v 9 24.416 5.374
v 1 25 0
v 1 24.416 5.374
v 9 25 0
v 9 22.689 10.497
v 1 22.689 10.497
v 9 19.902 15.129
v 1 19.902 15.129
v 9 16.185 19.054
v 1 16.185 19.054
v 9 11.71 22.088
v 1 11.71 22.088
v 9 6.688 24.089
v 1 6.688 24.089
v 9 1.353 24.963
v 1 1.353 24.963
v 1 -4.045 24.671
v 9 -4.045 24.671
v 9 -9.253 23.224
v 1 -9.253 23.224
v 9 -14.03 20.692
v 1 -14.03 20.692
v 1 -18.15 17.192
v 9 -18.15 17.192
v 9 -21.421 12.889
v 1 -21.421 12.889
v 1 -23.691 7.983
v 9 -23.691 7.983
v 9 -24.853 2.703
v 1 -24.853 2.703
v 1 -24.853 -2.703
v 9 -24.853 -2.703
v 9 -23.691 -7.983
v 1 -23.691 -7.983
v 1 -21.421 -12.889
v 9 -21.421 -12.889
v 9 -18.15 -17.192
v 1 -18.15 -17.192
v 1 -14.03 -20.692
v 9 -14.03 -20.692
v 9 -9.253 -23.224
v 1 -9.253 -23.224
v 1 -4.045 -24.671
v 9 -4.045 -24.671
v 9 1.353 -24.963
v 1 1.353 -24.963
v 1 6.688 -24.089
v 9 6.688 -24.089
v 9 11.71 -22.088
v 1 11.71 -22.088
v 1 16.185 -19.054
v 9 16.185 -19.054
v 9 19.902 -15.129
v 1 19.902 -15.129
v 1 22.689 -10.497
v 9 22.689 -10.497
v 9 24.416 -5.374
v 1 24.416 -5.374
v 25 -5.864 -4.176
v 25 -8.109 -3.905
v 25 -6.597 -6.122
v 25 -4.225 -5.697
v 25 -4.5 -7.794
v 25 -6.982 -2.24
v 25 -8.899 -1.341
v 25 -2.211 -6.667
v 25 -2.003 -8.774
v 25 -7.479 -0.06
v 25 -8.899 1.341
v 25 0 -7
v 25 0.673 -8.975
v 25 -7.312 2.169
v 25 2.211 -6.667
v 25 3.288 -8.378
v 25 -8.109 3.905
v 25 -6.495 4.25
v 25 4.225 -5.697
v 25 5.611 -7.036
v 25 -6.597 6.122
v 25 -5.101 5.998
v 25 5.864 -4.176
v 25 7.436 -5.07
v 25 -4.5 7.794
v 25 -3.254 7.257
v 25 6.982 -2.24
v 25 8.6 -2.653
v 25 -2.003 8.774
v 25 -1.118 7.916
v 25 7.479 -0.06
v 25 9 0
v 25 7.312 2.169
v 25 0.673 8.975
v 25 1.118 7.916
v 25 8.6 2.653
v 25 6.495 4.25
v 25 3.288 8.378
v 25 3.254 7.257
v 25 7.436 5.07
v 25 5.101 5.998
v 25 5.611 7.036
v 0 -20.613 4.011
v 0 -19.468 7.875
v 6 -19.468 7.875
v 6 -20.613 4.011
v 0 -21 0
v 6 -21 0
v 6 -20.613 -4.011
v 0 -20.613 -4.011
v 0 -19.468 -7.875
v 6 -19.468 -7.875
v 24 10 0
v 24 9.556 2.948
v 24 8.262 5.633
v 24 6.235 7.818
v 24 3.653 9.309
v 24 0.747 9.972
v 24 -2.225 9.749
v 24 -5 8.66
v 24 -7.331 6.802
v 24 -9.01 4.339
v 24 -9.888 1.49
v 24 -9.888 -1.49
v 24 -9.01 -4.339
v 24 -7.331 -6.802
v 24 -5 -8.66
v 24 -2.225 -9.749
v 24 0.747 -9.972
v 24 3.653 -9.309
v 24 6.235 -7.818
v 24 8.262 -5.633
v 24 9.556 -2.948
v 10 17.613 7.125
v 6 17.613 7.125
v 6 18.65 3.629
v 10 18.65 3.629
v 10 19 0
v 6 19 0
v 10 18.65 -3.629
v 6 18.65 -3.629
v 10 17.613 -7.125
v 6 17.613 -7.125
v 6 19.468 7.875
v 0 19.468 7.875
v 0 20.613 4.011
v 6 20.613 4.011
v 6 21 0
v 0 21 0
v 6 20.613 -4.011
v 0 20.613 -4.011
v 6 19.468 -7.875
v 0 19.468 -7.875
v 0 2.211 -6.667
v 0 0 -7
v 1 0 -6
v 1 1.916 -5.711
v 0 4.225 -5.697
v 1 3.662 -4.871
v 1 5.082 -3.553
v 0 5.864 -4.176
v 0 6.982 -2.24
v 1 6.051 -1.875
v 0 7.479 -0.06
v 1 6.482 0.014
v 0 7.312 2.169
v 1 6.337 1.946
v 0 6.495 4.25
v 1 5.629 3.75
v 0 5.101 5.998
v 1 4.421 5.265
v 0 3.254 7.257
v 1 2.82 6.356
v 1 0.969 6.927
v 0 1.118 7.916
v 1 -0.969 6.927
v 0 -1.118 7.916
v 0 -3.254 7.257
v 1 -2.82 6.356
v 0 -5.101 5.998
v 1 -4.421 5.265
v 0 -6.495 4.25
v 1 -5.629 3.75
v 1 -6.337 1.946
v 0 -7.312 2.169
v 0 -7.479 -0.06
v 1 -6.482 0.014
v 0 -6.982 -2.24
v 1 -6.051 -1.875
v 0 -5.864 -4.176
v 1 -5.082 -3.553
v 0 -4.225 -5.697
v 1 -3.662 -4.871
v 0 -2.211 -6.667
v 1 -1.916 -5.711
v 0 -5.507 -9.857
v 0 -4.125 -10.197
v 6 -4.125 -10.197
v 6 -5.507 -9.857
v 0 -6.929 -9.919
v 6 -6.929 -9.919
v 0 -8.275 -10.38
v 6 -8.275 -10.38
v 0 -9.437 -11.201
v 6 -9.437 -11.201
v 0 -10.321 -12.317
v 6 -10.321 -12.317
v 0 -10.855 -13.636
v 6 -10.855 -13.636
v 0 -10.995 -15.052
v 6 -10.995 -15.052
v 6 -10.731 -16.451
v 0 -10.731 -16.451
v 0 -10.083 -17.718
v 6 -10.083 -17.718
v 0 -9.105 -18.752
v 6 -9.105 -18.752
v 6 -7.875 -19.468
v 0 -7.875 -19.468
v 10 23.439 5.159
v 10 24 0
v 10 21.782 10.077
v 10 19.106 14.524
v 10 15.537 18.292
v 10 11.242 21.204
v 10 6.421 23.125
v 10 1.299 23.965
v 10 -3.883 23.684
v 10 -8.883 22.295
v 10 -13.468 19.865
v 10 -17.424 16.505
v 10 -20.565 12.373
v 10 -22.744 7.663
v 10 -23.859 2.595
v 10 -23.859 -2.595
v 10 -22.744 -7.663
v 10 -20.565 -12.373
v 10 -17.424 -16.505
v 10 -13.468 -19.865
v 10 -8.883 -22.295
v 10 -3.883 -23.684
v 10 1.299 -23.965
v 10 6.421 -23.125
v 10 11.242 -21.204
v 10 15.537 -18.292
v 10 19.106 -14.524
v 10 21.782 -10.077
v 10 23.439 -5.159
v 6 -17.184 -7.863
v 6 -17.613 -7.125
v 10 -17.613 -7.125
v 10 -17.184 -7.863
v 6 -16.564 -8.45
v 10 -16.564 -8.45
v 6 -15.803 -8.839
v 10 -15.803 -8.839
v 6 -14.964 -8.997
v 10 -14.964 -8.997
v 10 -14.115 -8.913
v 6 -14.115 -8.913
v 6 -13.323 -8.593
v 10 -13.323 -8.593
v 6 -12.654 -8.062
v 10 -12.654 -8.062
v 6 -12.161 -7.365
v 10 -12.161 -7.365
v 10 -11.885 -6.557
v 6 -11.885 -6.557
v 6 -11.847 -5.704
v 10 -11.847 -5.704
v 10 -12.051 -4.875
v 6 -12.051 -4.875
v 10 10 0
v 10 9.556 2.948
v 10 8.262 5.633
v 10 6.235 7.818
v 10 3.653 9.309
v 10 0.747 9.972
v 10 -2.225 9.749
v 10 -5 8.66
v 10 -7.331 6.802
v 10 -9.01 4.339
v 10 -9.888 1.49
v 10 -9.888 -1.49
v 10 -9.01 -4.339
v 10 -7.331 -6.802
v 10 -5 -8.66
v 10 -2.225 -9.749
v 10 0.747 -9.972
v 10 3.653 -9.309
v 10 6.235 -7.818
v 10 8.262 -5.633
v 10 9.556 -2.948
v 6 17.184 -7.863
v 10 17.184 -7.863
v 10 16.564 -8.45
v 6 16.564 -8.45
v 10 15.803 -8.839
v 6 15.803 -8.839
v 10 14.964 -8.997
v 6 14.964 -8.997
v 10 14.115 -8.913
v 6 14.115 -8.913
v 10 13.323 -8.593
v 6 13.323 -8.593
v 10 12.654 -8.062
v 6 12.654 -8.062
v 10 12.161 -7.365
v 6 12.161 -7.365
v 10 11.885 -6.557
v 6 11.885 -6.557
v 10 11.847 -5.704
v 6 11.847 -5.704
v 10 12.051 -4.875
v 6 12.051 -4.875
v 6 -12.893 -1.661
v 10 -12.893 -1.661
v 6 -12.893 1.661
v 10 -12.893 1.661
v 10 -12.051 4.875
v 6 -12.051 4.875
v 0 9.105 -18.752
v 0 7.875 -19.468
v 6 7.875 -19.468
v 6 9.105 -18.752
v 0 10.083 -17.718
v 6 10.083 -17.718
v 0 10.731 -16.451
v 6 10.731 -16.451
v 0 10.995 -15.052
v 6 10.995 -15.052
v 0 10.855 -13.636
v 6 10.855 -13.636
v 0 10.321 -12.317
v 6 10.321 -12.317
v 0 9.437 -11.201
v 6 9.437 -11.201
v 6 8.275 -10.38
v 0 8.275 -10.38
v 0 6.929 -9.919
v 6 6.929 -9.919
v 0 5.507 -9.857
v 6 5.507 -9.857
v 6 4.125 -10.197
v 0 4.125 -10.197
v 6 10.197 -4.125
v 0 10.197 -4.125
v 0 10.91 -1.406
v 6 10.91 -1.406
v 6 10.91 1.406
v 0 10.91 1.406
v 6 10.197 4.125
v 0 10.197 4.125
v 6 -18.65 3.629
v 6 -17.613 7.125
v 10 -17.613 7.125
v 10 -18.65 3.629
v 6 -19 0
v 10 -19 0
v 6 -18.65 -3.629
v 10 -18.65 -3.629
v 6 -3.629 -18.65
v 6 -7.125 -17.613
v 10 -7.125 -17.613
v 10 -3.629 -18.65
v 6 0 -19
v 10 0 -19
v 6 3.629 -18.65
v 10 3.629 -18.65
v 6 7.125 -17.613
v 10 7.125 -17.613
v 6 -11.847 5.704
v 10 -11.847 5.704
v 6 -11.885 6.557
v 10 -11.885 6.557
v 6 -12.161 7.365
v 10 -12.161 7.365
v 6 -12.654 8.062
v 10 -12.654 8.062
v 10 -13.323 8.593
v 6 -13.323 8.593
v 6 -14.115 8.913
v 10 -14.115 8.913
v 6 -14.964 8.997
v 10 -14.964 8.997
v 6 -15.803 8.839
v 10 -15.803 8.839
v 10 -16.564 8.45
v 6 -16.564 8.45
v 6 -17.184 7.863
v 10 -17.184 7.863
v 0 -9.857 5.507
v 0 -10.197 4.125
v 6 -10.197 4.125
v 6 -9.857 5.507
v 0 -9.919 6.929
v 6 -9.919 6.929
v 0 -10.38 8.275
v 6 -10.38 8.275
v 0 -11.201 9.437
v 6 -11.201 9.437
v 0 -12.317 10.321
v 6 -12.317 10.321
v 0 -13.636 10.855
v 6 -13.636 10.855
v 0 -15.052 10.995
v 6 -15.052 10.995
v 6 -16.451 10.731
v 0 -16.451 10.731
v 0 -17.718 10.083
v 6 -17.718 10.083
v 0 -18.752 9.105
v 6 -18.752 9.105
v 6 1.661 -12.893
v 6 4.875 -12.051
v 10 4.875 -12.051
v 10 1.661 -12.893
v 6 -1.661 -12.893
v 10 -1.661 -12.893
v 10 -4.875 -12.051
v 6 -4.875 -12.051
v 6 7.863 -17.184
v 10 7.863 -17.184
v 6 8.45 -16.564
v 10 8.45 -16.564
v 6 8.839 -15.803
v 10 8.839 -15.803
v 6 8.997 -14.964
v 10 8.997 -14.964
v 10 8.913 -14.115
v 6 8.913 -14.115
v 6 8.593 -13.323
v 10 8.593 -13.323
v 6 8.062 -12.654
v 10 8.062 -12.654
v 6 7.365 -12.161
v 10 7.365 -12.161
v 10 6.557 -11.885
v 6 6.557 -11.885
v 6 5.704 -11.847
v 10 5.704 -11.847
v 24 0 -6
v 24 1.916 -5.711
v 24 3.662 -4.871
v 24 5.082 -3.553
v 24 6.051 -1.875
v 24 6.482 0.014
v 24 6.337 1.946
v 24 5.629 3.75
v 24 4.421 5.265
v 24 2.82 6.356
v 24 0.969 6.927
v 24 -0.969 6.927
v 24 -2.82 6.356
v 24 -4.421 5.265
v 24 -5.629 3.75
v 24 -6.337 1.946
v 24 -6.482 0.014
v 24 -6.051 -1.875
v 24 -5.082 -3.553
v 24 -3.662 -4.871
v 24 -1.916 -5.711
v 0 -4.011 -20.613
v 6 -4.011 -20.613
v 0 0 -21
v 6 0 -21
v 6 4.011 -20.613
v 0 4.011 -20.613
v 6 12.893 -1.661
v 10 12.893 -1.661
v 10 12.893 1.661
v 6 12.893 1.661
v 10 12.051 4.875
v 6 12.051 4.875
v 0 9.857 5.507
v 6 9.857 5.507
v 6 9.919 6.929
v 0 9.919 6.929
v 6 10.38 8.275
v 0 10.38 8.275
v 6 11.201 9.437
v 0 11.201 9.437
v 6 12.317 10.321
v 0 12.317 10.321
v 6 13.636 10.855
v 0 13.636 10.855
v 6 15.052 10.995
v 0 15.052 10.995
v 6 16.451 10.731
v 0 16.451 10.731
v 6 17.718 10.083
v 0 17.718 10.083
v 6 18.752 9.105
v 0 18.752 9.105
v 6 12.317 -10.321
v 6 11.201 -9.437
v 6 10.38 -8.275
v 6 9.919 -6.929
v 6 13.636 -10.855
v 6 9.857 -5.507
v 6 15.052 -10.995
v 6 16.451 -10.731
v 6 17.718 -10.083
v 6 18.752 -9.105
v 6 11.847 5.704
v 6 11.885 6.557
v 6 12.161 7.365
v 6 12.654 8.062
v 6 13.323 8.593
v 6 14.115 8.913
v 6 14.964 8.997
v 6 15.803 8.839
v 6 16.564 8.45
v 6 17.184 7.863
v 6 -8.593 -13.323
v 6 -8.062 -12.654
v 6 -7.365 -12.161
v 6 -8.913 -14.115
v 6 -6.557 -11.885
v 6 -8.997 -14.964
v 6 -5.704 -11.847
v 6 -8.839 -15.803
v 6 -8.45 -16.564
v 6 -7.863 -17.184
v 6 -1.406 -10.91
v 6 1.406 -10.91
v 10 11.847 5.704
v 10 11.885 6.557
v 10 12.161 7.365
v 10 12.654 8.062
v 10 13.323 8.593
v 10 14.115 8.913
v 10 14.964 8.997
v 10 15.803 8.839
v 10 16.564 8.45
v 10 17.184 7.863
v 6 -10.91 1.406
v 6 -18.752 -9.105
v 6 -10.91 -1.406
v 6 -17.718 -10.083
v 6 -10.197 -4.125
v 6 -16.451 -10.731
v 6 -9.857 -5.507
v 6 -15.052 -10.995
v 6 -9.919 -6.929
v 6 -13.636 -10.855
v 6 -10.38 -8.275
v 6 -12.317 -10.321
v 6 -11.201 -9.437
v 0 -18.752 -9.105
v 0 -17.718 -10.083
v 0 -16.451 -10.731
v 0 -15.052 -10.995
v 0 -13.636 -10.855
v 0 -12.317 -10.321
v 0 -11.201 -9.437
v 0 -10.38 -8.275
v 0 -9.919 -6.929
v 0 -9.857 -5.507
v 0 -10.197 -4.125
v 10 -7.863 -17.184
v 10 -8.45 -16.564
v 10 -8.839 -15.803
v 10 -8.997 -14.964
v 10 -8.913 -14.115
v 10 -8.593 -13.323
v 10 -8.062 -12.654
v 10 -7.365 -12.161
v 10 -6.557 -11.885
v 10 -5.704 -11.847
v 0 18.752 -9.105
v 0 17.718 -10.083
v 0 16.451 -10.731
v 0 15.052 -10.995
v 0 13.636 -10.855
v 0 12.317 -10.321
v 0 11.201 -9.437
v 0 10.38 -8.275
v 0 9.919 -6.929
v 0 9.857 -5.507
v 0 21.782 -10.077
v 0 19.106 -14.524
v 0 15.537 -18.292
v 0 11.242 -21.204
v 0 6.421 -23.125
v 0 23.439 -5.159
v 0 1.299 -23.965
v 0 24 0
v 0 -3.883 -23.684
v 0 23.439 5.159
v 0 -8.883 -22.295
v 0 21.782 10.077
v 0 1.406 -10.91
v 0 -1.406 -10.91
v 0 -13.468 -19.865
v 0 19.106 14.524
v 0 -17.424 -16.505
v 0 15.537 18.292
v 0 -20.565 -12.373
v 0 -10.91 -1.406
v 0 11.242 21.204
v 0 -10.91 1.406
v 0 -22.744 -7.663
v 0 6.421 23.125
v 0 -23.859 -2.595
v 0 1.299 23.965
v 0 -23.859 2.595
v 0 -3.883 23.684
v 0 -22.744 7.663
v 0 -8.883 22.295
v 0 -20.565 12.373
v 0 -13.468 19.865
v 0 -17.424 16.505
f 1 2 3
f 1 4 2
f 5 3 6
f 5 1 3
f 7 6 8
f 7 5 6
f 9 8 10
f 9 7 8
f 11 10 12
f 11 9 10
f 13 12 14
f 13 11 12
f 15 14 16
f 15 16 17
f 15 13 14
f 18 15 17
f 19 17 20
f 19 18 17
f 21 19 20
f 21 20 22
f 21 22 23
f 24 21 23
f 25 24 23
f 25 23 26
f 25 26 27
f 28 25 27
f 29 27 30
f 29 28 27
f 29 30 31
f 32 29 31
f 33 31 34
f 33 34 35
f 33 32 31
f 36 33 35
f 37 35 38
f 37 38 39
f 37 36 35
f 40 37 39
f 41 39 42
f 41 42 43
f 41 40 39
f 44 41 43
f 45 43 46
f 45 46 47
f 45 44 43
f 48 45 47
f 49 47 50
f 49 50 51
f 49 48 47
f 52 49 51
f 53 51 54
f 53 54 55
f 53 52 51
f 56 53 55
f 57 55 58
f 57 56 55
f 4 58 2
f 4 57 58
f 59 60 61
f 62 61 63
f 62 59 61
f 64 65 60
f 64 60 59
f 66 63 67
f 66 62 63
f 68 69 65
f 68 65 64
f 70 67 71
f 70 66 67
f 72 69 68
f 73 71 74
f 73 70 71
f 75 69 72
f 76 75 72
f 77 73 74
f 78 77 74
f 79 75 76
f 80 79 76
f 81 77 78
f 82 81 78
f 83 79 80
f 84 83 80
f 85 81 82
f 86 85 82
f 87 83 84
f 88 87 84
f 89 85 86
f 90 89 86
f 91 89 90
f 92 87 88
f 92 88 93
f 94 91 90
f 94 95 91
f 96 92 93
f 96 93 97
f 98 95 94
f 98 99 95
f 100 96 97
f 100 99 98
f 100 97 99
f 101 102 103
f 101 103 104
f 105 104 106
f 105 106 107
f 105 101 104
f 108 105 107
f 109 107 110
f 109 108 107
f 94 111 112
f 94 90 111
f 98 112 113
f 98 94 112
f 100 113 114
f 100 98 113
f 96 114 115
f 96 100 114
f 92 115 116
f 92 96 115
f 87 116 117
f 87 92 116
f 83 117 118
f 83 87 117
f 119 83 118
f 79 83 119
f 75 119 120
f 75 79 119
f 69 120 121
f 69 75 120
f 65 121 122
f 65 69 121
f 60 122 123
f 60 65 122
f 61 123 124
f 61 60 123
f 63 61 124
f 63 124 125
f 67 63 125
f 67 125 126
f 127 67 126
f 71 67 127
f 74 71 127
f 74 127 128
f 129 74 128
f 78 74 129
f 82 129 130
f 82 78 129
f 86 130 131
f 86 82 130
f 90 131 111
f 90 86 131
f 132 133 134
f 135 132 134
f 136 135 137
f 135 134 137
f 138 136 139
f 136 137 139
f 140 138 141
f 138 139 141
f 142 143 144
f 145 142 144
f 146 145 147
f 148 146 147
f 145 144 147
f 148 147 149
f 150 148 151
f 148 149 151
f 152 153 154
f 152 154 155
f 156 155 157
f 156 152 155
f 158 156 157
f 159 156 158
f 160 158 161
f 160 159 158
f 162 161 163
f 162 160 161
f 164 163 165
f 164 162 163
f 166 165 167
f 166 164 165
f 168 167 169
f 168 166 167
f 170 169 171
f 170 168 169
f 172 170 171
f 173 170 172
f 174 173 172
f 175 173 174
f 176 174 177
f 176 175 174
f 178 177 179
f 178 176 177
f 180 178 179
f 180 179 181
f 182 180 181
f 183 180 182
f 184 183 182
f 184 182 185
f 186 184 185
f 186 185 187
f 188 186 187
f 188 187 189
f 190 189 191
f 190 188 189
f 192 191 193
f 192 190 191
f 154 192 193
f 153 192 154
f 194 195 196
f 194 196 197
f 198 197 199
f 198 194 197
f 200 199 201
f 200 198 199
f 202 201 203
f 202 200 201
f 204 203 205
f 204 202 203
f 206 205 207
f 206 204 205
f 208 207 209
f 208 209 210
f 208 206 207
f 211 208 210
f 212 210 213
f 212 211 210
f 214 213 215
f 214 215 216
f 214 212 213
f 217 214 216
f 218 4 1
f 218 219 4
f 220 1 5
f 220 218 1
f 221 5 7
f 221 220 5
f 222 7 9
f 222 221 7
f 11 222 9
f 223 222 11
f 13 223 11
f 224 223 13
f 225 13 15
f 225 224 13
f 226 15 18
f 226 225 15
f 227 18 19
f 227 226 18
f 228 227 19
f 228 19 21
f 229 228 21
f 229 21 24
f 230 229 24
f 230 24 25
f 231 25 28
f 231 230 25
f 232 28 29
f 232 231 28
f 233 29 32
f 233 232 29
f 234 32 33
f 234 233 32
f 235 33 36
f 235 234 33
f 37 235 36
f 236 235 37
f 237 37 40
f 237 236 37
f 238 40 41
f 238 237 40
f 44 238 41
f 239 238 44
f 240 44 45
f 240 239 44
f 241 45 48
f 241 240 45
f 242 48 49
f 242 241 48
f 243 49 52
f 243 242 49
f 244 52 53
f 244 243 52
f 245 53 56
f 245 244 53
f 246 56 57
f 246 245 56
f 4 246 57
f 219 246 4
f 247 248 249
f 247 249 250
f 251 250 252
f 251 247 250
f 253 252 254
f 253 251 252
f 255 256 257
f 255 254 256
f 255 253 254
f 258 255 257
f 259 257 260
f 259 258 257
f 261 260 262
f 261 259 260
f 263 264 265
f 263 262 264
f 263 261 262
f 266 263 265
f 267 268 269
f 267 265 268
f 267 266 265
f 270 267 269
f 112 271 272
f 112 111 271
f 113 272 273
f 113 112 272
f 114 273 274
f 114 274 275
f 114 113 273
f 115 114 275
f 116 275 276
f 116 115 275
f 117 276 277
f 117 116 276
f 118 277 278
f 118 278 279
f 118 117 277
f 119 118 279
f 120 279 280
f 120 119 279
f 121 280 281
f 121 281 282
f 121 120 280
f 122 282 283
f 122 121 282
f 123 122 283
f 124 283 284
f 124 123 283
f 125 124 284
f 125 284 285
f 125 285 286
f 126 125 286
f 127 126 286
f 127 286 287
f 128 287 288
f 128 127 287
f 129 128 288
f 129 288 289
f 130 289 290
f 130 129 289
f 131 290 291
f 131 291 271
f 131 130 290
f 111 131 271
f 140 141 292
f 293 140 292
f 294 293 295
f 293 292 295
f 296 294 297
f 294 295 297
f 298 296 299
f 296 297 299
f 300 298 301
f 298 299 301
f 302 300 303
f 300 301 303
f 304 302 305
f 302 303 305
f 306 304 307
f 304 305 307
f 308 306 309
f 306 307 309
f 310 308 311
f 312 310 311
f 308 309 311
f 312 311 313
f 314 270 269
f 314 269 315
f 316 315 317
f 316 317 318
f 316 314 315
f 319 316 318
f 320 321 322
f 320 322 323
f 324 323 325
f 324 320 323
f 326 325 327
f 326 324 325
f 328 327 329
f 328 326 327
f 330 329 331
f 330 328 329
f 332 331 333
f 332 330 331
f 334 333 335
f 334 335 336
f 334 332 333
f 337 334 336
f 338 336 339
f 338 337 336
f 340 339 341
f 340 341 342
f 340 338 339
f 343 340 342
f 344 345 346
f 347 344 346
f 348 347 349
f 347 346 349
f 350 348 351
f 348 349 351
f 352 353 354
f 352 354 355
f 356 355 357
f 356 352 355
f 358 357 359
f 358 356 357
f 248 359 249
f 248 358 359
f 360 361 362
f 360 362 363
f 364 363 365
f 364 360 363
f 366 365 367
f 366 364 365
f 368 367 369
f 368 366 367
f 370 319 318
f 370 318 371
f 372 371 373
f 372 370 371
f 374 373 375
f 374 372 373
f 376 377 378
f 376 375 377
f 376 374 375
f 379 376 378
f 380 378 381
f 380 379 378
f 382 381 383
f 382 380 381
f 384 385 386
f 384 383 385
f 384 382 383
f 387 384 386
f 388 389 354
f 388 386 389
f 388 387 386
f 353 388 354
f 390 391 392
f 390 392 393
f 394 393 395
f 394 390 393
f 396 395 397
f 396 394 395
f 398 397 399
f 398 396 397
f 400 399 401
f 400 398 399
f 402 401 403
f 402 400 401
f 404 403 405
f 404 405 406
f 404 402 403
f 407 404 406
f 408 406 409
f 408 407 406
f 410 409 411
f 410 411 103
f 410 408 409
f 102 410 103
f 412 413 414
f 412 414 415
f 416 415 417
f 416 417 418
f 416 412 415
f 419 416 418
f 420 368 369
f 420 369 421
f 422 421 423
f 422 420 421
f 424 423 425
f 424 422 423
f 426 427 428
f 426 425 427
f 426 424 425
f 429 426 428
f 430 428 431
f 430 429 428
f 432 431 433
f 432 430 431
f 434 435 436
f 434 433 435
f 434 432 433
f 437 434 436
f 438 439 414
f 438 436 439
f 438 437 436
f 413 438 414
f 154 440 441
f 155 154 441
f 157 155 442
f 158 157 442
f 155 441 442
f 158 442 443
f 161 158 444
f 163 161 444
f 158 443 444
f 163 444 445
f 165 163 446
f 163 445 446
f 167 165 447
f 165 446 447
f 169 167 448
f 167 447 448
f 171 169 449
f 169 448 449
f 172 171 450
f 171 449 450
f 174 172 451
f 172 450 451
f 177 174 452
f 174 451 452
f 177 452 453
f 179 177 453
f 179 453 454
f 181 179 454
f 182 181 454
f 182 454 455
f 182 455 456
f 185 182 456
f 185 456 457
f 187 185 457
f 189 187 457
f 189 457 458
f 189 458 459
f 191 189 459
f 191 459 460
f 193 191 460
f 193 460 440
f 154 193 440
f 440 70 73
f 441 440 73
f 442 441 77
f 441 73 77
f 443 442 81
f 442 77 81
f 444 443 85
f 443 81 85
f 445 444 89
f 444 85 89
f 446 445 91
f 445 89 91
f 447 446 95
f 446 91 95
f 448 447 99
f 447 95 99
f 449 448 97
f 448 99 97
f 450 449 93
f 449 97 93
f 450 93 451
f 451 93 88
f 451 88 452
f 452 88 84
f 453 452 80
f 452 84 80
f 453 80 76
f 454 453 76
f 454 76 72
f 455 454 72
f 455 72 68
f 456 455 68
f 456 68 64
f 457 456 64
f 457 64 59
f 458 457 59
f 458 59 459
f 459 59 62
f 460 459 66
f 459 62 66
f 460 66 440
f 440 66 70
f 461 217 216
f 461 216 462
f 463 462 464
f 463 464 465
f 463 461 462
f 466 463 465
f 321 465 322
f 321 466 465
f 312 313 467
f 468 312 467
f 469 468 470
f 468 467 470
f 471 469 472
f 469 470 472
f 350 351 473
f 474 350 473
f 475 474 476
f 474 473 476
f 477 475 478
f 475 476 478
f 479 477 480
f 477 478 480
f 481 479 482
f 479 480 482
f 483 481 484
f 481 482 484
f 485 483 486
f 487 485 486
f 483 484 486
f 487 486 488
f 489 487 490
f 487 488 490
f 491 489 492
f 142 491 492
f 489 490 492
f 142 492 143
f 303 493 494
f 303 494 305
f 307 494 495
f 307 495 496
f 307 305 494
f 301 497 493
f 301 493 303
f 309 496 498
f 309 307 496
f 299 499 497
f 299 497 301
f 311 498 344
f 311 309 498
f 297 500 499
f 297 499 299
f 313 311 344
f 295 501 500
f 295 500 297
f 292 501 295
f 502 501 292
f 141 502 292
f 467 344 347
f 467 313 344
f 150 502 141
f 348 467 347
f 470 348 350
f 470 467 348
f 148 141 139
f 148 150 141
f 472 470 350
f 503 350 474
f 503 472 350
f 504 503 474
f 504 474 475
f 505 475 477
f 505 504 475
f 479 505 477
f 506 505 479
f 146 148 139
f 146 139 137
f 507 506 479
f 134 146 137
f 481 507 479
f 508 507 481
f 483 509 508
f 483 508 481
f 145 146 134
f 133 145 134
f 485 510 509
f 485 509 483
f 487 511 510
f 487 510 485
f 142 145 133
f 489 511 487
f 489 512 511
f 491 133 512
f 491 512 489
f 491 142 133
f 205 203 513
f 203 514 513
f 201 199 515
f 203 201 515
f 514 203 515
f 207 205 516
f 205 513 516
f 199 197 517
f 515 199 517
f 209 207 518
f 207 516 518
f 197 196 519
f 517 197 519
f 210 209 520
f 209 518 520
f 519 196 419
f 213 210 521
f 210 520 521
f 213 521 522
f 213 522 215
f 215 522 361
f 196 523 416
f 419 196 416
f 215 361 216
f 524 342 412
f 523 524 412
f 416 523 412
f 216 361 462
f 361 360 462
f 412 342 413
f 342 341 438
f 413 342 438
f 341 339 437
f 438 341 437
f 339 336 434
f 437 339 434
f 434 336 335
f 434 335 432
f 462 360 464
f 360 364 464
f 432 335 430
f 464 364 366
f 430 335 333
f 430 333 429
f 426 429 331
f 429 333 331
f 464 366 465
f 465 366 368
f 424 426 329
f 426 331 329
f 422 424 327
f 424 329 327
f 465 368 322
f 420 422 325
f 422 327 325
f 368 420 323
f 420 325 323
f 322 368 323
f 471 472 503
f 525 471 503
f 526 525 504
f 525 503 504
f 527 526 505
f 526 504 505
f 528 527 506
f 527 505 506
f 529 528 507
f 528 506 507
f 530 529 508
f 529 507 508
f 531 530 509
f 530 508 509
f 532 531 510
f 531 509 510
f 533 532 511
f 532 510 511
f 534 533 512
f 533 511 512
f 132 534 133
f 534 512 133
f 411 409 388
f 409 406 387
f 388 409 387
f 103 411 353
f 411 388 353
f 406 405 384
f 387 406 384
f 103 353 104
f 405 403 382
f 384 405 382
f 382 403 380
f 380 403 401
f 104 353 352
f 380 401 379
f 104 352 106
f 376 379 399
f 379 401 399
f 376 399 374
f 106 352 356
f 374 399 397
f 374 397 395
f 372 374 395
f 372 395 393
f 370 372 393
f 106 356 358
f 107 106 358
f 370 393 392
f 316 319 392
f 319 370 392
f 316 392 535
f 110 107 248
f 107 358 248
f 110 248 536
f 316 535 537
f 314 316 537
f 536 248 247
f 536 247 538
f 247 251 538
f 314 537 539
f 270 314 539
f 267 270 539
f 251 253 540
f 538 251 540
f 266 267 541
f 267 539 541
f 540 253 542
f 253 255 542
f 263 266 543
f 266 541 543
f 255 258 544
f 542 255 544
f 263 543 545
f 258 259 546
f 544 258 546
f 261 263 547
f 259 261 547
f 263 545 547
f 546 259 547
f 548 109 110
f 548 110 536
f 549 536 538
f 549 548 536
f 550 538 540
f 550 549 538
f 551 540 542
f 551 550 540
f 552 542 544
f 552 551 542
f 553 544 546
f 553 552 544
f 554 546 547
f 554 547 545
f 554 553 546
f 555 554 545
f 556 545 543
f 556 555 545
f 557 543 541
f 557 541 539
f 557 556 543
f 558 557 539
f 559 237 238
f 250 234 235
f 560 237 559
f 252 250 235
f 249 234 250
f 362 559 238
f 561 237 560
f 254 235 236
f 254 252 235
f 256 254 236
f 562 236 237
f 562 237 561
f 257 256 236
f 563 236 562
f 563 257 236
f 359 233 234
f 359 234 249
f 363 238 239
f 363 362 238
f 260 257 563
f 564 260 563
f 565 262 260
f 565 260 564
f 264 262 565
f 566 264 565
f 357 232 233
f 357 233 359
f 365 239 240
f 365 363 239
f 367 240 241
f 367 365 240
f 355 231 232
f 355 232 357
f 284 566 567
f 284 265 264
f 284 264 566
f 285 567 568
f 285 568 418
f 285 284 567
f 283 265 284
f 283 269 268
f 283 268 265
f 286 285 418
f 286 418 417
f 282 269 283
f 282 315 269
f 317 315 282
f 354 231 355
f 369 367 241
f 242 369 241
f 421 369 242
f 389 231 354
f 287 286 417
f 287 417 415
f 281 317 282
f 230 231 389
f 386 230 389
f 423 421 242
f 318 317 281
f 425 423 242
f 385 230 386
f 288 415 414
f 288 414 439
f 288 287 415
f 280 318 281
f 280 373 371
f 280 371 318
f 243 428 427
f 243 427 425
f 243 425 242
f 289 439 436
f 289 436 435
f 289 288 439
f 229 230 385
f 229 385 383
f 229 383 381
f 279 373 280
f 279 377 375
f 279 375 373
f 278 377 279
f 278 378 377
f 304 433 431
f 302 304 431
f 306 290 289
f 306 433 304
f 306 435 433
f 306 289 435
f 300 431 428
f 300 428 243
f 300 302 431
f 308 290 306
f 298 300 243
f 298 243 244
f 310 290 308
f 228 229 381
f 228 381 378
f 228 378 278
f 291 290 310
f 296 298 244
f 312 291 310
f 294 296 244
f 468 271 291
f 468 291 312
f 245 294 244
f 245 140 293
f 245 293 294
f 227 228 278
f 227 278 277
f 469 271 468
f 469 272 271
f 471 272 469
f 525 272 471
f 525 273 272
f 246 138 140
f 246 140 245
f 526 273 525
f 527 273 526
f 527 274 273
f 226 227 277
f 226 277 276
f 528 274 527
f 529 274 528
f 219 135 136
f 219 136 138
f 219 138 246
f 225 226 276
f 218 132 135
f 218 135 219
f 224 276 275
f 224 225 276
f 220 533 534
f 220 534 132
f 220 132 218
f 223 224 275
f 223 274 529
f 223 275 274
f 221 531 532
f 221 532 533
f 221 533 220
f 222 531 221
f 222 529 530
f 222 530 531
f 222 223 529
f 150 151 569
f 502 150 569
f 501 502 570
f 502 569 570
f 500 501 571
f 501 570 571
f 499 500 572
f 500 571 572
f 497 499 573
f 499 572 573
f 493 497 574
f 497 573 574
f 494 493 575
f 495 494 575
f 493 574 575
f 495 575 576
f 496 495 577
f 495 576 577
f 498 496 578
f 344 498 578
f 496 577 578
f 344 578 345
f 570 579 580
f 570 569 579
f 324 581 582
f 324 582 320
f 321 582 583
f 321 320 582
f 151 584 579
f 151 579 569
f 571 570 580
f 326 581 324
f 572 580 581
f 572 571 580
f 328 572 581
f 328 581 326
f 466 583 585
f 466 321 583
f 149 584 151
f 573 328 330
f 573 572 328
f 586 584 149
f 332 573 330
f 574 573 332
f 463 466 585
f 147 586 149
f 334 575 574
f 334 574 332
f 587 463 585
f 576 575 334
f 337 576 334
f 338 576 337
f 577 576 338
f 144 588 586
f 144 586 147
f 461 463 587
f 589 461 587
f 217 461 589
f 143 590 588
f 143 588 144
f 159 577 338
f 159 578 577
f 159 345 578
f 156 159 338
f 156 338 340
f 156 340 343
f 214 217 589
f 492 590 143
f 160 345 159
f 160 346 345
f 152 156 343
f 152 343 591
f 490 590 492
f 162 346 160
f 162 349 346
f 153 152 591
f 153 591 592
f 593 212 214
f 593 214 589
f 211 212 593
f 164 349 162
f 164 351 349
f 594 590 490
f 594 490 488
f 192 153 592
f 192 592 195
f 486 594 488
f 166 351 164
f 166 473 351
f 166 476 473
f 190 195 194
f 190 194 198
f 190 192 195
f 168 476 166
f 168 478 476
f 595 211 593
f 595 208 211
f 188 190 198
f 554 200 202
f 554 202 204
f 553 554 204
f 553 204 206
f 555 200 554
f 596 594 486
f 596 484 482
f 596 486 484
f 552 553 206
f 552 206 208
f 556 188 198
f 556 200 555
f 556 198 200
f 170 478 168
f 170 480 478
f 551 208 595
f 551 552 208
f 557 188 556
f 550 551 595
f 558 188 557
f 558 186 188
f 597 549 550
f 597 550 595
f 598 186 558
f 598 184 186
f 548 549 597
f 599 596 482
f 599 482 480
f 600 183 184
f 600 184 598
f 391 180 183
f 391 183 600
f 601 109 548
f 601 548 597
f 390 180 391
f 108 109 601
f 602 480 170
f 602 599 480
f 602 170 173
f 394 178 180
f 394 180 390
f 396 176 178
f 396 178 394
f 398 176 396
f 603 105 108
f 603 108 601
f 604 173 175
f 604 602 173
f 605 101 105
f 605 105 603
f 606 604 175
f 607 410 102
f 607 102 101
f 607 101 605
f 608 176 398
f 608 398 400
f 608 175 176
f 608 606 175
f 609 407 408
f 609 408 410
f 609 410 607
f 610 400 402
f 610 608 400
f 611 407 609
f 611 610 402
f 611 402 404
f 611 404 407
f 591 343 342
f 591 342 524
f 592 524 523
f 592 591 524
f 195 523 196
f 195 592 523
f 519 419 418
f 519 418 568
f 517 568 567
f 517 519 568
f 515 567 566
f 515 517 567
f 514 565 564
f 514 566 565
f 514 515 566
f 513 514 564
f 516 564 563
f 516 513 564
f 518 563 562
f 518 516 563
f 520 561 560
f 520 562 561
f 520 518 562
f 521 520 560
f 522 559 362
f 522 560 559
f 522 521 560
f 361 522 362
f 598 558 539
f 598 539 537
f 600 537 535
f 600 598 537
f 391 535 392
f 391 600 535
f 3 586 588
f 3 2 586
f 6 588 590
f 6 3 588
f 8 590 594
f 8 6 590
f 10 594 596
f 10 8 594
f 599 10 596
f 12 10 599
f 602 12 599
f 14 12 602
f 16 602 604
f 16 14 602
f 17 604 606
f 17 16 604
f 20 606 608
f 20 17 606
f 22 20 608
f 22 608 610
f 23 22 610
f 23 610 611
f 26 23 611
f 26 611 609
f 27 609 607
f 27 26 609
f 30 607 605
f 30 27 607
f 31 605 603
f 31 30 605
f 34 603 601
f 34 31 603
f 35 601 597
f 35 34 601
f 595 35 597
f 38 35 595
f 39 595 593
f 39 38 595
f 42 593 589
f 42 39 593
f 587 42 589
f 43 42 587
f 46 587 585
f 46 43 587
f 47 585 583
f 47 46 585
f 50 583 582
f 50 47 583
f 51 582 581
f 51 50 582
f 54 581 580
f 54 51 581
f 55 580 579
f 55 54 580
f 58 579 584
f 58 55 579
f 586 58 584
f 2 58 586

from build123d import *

# Parameters (mm, degrees)
CUT_EXTRUDE_2_DEPTH = 6
CUT_EXTRUDE_3_DEPTH = 26
SKETCH_3_R          = 6.5
CUT_EXTRUDE_4_DEPTH = 26
CHAMFER_1_SIZE      = 1
CHAMFER_3_SIZE      = 1


with BuildPart() as part:
    # Эскиз1 → Повернуть1 (revolve)
    with BuildSketch(Plane.XY):
        Polygon((0, 0), (0, 24), (1, 25), (9, 25), (10, 24), (10, 10), (24, 10), (25, 9), (25, 0), align=None)
    revolve(axis=Axis((0, 0, 0), (1, 0, 0)))

    # Эскиз4 → Вырез-Вытянуть2 (cut)
    with BuildSketch(Plane.ZY):
        with BuildLine():
            ThreePointArc((7.875, 19.467521029), (0, 21), (-7.875, 19.467521029))
            ThreePointArc((-7.875, 19.467521029), (-10.635124054, 12.957396974), (-4.125, 10.19727292))
            ThreePointArc((-4.125, 10.19727292), (0, 11), (4.125, 10.19727292))
            ThreePointArc((4.125, 10.19727292), (10.635124054, 12.957396974), (7.875, 19.467521029))
        make_face()
        with BuildLine():
            ThreePointArc((-10.19727292, 4.125), (-11, 0), (-10.19727292, -4.125))
            ThreePointArc((-10.19727292, -4.125), (-12.957396974, -10.635124054), (-19.467521029, -7.875))
            ThreePointArc((-19.467521029, -7.875), (-21, 0), (-19.467521029, 7.875))
            ThreePointArc((-19.467521029, 7.875), (-12.957396974, 10.635124054), (-10.19727292, 4.125))
        make_face()
        with BuildLine():
            ThreePointArc((-4.125, -10.19727292), (0, -11), (4.125, -10.19727292))
            ThreePointArc((4.125, -10.19727292), (10.635124054, -12.957396974), (7.875, -19.467521029))
            ThreePointArc((7.875, -19.467521029), (0, -21), (-7.875, -19.467521029))
            ThreePointArc((-7.875, -19.467521029), (-10.635124054, -12.957396974), (-4.125, -10.19727292))
        make_face()
    extrude(amount=-CUT_EXTRUDE_2_DEPTH, mode=Mode.SUBTRACT)

    # Эскиз5 → Вырез-Вытянуть3 (cut, through all)
    with BuildSketch(Plane.ZY):
        with BuildLine():
            ThreePointArc((7.125, 17.613471407), (0, 19), (-7.125, 17.613471407))
            ThreePointArc((-7.125, 17.613471407), (-8.781074433, 13.707396974), (-4.875, 12.051322542))
            ThreePointArc((-4.875, 12.051322542), (0, 13), (4.875, 12.051322542))
            ThreePointArc((4.875, 12.051322542), (8.781074433, 13.707396974), (7.125, 17.613471407))
        make_face()
        with BuildLine():
            ThreePointArc((-12.051322542, 4.875), (-13, 0), (-12.051322542, -4.875))
            ThreePointArc((-12.051322542, -4.875), (-13.707396974, -8.781074433), (-17.613471407, -7.125))
            ThreePointArc((-17.613471407, -7.125), (-19, 0), (-17.613471407, 7.125))
            ThreePointArc((-17.613471407, 7.125), (-13.707396974, 8.781074433), (-12.051322542, 4.875))
        make_face()
        with BuildLine():
            ThreePointArc((-4.875, -12.051322542), (0, -13), (4.875, -12.051322542))
            ThreePointArc((4.875, -12.051322542), (8.781074433, -13.707396974), (7.125, -17.613471407))
            ThreePointArc((7.125, -17.613471407), (0, -19), (-7.125, -17.613471407))
            ThreePointArc((-7.125, -17.613471407), (-8.781074433, -13.707396974), (-4.875, -12.051322542))
        make_face()
    extrude(amount=-CUT_EXTRUDE_3_DEPTH, mode=Mode.SUBTRACT)

    # Эскиз3 → Вырез-Вытянуть4 (cut, through all)
    with BuildSketch(Plane(origin=(25, 0, 0), x_dir=(0, 0, -1), z_dir=(1, 0, 0))):
        with Locations((-0.5, 0)):
            Circle(SKETCH_3_R)
    extrude(amount=-CUT_EXTRUDE_4_DEPTH, mode=Mode.SUBTRACT)

    # Фаска1
    chamfer_1_edges = [part.edges().sort_by_distance(p)[0] for p in [
        (25, 0, 7),
    ]]
    chamfer(chamfer_1_edges, length=CHAMFER_1_SIZE)

    # Фаска3
    chamfer_3_edges = [part.edges().sort_by_distance(p)[0] for p in [
        (0, 0, 7),
    ]]
    chamfer(chamfer_3_edges, length=CHAMFER_3_SIZE)


solid = part.part
